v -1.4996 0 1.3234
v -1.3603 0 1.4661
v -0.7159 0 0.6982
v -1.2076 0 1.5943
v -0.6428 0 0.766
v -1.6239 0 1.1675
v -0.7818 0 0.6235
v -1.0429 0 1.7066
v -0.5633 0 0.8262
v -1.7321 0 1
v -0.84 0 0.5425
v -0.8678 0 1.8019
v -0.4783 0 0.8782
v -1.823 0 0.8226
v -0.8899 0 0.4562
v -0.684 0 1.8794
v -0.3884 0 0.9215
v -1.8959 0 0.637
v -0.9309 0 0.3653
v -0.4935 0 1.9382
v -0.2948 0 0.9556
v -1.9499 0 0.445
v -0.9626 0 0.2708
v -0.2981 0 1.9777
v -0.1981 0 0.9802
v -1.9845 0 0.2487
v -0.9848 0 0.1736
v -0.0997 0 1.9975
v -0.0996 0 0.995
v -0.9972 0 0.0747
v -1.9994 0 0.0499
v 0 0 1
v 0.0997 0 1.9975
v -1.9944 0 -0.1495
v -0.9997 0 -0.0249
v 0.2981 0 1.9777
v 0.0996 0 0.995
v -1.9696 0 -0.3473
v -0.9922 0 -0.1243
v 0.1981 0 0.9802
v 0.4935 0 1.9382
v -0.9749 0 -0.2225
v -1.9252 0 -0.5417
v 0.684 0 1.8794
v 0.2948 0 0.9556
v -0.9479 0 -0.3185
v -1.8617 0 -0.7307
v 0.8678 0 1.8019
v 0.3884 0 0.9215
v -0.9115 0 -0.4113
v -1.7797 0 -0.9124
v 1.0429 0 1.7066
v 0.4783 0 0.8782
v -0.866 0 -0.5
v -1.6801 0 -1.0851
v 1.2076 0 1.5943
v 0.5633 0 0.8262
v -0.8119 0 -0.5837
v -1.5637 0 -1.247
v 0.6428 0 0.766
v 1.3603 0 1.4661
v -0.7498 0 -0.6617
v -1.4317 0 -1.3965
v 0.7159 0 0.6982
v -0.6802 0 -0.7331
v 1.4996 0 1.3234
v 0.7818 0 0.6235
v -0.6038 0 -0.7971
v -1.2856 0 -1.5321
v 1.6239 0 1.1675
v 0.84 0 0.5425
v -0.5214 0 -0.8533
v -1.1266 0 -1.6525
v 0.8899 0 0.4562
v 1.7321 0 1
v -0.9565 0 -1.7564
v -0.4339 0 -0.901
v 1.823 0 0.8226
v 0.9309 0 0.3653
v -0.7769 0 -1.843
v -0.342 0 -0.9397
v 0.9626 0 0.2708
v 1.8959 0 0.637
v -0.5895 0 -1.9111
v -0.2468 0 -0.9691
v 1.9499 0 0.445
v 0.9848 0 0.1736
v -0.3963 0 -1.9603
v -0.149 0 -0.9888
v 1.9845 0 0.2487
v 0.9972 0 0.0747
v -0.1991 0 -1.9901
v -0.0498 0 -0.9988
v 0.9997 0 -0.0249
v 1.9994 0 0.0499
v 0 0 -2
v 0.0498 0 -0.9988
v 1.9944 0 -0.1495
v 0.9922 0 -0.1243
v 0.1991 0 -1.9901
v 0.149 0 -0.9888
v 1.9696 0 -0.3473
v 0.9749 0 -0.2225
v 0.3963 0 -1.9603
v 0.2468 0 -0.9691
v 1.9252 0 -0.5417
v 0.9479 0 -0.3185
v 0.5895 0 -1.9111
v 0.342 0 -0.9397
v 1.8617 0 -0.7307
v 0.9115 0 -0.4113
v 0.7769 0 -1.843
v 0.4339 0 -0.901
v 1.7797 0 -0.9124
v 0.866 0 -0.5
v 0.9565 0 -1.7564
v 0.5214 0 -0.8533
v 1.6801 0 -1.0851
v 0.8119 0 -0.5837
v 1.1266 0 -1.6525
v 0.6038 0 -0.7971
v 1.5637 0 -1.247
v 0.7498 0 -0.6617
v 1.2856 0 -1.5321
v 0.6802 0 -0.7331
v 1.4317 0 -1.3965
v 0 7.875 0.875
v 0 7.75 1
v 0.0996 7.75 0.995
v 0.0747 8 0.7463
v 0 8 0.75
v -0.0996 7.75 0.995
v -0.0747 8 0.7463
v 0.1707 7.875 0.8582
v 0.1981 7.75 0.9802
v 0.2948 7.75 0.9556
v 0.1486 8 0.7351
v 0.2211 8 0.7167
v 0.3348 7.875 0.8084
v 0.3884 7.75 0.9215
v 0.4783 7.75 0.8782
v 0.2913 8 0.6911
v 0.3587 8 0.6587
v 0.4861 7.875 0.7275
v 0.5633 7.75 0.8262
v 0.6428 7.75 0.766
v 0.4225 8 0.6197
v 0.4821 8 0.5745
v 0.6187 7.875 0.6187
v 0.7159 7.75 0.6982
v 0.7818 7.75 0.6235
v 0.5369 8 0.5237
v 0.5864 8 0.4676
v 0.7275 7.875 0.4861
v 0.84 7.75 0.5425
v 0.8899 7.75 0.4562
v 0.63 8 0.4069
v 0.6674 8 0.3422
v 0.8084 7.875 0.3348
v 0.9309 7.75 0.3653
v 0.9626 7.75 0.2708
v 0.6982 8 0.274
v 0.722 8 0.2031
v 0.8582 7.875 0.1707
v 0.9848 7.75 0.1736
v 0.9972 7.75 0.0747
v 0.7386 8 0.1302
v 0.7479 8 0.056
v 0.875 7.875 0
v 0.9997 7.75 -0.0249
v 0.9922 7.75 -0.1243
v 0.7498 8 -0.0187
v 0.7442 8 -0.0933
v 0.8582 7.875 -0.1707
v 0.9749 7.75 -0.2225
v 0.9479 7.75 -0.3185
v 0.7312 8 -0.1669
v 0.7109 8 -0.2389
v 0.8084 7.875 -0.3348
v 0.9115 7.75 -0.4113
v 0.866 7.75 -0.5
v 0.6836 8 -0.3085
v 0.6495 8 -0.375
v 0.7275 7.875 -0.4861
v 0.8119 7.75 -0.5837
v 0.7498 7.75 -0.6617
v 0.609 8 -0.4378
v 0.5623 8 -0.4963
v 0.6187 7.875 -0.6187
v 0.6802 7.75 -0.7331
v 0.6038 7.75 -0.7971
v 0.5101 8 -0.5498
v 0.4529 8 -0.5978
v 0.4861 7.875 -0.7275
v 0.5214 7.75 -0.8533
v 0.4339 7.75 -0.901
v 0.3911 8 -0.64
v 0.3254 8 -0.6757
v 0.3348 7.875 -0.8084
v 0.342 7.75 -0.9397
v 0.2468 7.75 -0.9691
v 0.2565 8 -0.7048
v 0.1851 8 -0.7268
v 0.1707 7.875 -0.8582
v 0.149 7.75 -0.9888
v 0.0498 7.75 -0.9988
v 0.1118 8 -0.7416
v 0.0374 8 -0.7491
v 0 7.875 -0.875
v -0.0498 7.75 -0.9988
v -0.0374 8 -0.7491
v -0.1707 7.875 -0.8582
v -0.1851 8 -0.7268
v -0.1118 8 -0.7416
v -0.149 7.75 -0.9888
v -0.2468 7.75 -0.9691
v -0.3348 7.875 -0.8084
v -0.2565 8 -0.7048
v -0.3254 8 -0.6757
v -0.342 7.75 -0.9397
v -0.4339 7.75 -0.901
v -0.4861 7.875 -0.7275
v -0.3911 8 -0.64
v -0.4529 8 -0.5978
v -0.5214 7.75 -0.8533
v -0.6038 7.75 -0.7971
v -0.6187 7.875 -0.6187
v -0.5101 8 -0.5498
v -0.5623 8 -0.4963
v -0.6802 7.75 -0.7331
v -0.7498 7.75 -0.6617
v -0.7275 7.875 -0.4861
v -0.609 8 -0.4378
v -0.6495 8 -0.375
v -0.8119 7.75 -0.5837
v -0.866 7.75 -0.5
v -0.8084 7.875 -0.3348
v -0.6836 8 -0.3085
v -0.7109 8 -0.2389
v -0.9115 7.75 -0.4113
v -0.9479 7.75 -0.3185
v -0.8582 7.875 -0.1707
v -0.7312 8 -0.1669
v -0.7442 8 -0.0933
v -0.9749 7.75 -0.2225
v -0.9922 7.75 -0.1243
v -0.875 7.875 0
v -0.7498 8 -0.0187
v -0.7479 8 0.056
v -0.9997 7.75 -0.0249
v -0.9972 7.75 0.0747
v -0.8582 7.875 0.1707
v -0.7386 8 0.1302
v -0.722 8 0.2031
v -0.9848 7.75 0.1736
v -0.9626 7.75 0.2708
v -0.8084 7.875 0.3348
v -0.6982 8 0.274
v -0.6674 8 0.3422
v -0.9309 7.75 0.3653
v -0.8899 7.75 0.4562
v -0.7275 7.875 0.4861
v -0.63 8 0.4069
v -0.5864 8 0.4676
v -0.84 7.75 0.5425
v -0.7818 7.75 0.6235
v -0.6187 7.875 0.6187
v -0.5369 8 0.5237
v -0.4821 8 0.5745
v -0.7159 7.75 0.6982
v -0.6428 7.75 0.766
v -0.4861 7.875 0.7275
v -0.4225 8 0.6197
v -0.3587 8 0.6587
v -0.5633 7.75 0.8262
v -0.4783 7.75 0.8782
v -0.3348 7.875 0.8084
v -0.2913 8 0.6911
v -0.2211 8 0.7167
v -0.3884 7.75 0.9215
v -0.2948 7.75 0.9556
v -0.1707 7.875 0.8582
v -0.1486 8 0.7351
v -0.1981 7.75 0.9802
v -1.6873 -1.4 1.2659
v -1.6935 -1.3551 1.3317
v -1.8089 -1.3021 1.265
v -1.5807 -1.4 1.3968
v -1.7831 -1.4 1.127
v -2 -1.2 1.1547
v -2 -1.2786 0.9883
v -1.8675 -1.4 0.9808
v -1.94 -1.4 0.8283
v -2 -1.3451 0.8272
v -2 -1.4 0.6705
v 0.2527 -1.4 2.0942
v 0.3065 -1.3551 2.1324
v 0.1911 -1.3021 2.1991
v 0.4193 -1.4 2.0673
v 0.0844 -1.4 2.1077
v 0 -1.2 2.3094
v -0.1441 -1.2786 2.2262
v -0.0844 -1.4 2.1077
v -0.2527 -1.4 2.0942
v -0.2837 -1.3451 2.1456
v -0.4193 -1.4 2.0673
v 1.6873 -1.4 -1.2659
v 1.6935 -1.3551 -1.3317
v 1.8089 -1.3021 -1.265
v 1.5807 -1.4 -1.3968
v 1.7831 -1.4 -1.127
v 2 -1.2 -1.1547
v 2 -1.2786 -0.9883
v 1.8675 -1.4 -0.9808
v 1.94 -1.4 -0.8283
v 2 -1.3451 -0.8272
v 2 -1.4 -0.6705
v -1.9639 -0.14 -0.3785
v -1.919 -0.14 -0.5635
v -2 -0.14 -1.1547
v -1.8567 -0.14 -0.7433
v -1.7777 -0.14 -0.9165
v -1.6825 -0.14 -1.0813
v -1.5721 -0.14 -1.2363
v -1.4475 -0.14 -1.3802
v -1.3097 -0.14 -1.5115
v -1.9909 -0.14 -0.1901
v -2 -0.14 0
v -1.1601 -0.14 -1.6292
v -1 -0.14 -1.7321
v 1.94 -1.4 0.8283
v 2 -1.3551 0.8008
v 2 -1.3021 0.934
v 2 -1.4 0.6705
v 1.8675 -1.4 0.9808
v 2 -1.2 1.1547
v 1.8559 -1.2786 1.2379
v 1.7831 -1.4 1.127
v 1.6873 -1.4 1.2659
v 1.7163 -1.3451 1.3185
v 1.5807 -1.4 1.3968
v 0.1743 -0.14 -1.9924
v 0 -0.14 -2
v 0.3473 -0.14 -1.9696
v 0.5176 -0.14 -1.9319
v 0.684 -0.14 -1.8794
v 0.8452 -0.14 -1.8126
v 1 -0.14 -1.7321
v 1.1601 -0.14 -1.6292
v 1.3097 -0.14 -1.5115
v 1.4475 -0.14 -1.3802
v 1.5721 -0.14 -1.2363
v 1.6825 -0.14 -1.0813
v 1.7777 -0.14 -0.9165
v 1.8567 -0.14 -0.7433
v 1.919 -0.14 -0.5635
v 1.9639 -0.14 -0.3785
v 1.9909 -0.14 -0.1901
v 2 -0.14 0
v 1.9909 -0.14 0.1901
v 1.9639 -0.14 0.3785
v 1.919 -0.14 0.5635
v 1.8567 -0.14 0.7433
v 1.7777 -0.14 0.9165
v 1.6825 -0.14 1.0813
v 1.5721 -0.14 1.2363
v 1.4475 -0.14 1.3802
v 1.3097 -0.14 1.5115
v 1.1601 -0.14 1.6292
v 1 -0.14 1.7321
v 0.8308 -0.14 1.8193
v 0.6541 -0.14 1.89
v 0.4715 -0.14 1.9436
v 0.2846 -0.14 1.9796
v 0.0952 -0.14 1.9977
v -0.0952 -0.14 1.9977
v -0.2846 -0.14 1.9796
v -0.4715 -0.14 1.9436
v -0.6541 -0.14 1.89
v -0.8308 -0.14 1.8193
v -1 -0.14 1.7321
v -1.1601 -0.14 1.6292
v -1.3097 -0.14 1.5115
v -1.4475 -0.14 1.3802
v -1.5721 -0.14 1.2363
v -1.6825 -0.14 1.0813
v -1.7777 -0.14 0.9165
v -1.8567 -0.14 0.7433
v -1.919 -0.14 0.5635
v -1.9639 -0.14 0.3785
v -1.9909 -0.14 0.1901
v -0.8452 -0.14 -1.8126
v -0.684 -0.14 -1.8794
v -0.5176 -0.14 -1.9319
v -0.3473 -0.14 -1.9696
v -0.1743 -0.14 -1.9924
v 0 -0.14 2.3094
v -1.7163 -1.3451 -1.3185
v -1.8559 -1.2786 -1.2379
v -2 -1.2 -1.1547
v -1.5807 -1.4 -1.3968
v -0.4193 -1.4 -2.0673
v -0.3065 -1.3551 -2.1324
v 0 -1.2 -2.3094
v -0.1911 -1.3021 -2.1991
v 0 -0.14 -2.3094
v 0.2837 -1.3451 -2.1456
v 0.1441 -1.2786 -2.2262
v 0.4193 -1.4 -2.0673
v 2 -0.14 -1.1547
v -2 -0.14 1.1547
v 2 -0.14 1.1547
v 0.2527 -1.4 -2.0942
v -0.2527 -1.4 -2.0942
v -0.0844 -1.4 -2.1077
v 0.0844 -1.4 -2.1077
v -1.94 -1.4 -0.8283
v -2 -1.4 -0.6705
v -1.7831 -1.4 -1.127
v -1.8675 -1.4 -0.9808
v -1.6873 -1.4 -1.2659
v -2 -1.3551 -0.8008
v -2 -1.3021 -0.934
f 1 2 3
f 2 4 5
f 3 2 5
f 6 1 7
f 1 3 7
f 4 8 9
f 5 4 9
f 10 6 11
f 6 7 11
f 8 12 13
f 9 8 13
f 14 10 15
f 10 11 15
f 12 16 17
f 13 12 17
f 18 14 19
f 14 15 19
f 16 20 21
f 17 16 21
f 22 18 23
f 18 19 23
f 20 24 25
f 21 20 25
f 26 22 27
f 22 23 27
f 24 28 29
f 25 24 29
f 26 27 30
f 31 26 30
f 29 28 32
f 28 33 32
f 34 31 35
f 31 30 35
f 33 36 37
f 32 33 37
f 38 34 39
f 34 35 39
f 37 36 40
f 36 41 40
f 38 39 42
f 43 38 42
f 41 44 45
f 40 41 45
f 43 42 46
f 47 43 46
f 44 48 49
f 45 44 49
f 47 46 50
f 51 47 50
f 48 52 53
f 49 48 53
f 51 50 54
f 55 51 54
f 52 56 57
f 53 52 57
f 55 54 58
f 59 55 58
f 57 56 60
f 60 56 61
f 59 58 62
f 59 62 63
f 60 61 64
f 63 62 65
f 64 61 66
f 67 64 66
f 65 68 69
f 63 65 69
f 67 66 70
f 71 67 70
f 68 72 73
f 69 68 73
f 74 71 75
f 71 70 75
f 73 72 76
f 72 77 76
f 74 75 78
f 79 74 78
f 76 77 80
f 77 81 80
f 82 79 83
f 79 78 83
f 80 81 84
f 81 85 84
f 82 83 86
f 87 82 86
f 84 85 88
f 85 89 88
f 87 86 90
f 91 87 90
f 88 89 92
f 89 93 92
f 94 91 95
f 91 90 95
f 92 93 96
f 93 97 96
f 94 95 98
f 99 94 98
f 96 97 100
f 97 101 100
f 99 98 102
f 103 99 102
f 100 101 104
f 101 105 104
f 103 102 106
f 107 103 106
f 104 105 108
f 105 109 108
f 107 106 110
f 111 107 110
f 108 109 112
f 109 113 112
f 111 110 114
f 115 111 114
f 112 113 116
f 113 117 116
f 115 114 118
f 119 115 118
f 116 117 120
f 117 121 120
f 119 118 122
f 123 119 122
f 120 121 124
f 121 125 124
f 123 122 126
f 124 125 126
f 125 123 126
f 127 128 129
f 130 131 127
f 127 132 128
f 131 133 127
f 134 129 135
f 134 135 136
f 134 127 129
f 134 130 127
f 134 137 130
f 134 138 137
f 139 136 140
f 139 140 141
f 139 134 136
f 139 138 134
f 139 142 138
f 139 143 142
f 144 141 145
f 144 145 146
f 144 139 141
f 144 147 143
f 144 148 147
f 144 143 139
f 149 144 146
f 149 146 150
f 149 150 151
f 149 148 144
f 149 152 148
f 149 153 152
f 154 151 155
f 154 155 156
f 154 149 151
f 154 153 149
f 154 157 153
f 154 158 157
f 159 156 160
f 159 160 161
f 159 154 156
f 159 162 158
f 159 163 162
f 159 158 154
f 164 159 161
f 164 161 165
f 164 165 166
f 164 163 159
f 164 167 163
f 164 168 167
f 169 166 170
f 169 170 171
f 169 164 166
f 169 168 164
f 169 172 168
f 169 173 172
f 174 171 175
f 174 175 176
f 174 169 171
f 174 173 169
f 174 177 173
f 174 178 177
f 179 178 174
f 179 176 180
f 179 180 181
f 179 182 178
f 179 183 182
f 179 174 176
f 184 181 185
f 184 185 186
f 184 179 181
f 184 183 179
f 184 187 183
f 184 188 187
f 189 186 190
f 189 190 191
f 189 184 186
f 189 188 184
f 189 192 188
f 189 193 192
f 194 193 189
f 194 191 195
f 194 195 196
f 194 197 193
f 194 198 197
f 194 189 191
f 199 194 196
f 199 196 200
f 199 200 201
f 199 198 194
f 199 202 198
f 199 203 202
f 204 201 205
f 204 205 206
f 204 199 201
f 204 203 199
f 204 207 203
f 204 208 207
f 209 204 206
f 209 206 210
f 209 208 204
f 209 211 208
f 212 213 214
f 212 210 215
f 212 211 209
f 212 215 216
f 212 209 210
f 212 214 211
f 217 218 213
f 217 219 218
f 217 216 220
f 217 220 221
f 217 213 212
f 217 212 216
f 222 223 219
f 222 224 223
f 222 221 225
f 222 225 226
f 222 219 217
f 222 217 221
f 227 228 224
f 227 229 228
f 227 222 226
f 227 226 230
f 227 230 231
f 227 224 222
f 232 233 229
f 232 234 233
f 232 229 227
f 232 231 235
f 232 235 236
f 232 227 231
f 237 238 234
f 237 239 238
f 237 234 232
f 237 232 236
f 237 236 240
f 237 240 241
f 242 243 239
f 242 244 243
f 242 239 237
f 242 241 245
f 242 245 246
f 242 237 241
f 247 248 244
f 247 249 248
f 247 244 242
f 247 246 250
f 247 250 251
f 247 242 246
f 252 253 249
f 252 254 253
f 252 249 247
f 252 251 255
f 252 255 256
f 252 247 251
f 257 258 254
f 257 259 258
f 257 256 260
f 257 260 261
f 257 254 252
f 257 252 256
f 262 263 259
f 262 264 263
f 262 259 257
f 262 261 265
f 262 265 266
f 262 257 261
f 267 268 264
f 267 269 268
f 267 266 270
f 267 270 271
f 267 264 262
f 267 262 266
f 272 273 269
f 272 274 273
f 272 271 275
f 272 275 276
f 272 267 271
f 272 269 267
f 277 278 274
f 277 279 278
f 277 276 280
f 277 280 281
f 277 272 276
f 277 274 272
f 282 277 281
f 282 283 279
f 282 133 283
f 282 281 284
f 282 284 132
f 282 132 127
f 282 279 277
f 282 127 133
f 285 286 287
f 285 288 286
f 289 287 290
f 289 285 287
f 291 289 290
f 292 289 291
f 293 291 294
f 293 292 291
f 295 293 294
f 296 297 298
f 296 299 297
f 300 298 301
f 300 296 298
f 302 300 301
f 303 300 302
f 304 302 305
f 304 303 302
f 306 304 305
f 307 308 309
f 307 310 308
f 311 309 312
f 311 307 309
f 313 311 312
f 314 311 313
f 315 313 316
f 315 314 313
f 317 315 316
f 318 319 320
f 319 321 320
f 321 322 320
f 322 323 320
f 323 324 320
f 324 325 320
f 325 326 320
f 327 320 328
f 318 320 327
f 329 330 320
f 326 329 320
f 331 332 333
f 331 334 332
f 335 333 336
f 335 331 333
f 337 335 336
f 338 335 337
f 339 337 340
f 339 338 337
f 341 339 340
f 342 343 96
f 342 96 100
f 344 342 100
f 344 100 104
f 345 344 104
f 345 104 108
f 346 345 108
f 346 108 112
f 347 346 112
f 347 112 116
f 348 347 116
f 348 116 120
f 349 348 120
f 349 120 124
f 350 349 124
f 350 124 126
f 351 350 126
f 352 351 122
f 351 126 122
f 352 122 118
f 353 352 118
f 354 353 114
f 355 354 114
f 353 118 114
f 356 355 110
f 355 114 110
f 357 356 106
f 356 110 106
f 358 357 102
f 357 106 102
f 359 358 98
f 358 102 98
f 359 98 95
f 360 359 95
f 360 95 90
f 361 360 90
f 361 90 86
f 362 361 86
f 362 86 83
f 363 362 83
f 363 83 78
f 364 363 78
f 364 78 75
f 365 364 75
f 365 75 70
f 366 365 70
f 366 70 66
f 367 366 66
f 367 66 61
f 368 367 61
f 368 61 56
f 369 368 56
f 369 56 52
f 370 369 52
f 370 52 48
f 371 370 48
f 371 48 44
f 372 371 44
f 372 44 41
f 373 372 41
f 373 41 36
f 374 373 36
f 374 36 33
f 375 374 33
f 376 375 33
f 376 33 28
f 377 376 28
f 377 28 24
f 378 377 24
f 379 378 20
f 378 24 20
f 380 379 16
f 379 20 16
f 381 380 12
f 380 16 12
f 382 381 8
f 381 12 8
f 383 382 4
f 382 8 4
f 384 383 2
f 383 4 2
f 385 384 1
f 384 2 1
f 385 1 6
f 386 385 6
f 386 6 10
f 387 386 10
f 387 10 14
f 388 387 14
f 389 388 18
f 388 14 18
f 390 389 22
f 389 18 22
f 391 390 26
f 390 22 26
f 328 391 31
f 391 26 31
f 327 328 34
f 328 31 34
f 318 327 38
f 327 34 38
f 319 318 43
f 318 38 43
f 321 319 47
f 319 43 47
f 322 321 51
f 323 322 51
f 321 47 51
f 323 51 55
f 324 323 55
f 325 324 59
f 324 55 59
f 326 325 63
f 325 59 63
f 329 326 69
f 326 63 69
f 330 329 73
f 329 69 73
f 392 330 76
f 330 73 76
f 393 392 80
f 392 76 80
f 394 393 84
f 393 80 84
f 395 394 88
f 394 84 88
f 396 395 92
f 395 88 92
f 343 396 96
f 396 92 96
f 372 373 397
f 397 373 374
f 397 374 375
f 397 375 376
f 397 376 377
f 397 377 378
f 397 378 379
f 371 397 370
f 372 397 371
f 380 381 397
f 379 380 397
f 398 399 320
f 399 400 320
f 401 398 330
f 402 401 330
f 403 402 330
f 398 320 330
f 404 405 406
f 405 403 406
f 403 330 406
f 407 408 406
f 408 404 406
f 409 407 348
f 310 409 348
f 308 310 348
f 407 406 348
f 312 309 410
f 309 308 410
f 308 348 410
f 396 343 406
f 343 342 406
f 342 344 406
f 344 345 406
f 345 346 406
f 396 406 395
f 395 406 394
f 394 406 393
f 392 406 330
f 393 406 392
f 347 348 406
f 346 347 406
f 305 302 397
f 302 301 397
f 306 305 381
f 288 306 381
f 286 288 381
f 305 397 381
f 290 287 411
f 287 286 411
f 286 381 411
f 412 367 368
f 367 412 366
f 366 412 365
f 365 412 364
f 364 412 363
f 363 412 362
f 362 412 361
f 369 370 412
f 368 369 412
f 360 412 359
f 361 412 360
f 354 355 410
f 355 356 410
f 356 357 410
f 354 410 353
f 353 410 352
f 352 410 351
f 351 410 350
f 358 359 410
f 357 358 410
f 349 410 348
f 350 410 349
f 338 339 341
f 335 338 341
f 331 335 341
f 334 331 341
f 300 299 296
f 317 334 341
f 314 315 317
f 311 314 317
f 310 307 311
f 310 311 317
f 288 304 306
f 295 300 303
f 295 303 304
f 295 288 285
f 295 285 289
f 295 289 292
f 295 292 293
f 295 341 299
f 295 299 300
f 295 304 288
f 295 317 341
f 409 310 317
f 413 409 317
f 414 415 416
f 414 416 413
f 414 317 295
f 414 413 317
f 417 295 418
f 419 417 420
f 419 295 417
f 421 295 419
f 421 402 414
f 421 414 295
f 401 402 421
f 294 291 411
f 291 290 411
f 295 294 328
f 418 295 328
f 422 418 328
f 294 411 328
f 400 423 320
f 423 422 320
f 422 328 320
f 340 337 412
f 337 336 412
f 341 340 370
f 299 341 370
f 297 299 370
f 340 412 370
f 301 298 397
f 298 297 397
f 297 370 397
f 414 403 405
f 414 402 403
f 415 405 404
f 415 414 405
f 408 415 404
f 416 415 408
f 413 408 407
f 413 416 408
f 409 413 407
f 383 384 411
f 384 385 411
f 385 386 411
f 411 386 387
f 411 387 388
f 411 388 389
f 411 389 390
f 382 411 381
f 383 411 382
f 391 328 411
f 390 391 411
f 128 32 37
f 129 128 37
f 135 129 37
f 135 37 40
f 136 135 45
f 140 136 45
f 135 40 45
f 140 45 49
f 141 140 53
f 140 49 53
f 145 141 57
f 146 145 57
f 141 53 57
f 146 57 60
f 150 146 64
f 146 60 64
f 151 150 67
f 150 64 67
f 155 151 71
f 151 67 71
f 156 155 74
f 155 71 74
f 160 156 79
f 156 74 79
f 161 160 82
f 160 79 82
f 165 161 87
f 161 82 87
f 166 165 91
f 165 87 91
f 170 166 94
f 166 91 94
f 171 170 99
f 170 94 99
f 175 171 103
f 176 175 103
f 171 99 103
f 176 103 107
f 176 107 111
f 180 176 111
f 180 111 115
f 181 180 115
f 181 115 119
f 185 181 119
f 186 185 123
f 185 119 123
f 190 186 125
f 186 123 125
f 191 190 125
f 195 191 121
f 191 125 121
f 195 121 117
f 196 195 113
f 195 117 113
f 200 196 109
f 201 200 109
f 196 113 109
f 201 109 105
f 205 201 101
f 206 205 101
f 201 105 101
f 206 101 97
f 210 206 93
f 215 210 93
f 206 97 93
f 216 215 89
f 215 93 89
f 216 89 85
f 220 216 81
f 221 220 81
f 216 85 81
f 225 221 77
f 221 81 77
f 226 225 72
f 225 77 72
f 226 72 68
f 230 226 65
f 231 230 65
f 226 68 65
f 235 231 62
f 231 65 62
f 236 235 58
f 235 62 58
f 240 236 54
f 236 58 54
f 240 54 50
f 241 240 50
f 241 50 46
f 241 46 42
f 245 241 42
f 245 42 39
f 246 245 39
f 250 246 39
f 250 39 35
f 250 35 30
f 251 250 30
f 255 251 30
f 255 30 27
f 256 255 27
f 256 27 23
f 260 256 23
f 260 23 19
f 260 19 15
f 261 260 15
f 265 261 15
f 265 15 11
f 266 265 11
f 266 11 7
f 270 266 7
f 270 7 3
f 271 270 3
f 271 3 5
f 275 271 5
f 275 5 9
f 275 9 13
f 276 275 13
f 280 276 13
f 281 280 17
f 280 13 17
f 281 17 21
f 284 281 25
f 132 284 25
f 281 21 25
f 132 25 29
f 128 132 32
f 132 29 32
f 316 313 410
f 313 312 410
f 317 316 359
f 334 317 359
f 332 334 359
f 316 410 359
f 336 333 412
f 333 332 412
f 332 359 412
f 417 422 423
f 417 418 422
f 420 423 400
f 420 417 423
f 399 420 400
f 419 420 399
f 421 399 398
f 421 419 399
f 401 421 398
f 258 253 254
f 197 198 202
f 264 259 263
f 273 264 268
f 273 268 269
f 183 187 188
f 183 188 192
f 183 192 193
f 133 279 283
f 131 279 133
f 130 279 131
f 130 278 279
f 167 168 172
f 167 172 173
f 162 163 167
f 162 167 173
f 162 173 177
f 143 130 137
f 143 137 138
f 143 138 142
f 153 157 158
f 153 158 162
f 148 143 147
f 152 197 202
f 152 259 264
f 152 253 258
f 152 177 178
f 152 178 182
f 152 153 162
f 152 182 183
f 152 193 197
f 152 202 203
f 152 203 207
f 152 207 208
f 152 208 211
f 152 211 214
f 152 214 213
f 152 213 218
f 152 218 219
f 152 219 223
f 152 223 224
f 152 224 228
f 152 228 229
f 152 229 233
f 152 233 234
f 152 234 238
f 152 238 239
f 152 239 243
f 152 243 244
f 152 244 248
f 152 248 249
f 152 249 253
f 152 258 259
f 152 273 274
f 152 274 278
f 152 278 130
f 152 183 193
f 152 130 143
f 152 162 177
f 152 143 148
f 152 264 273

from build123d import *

# Parameters (mm, degrees)
ESQUISSE1_R    = 1
CORPS_DEPTH    = 8
ESQUISSE2_R    = 2
APPUIS_DEPTH   = 0.14
TETE_DEPTH     = 1.26
CHANFREIN_SIZE = 0.25


with BuildPart() as part:
    # Esquisse1 → CORPS (new body)
    with BuildSketch(Plane(origin=(0, 0, 0), x_dir=(1, 0, 0), z_dir=(0, 1, 0))):
        with Locations(Location((0, 0, 0), (0, 0, 270))):
            Circle(ESQUISSE1_R)
    extrude(amount=CORPS_DEPTH)

    # Esquisse2 → APPUIS (add)
    with BuildSketch(Plane(origin=(0, 0, 0), x_dir=(-1, 0, 0), z_dir=(0, -1, 0))):
        with Locations(Location((0, 0, 0), (0, 0, 90))):
            Circle(ESQUISSE2_R)
    extrude(amount=APPUIS_DEPTH)

    # Esquisse3 → TETE (add)
    with BuildSketch(Plane(origin=(0, -0.14, 0), x_dir=(-1, 0, 0), z_dir=(0, -1, 0))):
        Polygon((0, -2.309401077), (2, -1.154700538), (2, 1.154700538), (0, 2.309401077), (-2, 1.154700538), (-2, -1.154700538), align=None)
    extrude(amount=TETE_DEPTH)

    # Esquisse4 → CHANFREIN_TETE (revolve, cut)
    with BuildSketch(Plane(origin=(0, 0, 0), x_dir=(0, 0, -1), z_dir=(1, 0, 0)), mode=Mode.PRIVATE) as chanfrein_tete_sk:
        Polygon((2.309401077, -1.2), (2.109401077, -1.4), (2.309401077, -1.4), align=None)
    revolve(chanfrein_tete_sk.sketch.rotate(Axis((0, 0, 0), (0, -1, 0)), 210), axis=Axis((0, 0, 0), (0, -1, 0)), mode=Mode.SUBTRACT)

    # CHANFREIN
    chanfrein_edges = [part.edges().sort_by_distance(p)[0] for p in [
        (0, 8, -1),
    ]]
    chamfer(chanfrein_edges, length=CHANFREIN_SIZE)


solid = part.part
